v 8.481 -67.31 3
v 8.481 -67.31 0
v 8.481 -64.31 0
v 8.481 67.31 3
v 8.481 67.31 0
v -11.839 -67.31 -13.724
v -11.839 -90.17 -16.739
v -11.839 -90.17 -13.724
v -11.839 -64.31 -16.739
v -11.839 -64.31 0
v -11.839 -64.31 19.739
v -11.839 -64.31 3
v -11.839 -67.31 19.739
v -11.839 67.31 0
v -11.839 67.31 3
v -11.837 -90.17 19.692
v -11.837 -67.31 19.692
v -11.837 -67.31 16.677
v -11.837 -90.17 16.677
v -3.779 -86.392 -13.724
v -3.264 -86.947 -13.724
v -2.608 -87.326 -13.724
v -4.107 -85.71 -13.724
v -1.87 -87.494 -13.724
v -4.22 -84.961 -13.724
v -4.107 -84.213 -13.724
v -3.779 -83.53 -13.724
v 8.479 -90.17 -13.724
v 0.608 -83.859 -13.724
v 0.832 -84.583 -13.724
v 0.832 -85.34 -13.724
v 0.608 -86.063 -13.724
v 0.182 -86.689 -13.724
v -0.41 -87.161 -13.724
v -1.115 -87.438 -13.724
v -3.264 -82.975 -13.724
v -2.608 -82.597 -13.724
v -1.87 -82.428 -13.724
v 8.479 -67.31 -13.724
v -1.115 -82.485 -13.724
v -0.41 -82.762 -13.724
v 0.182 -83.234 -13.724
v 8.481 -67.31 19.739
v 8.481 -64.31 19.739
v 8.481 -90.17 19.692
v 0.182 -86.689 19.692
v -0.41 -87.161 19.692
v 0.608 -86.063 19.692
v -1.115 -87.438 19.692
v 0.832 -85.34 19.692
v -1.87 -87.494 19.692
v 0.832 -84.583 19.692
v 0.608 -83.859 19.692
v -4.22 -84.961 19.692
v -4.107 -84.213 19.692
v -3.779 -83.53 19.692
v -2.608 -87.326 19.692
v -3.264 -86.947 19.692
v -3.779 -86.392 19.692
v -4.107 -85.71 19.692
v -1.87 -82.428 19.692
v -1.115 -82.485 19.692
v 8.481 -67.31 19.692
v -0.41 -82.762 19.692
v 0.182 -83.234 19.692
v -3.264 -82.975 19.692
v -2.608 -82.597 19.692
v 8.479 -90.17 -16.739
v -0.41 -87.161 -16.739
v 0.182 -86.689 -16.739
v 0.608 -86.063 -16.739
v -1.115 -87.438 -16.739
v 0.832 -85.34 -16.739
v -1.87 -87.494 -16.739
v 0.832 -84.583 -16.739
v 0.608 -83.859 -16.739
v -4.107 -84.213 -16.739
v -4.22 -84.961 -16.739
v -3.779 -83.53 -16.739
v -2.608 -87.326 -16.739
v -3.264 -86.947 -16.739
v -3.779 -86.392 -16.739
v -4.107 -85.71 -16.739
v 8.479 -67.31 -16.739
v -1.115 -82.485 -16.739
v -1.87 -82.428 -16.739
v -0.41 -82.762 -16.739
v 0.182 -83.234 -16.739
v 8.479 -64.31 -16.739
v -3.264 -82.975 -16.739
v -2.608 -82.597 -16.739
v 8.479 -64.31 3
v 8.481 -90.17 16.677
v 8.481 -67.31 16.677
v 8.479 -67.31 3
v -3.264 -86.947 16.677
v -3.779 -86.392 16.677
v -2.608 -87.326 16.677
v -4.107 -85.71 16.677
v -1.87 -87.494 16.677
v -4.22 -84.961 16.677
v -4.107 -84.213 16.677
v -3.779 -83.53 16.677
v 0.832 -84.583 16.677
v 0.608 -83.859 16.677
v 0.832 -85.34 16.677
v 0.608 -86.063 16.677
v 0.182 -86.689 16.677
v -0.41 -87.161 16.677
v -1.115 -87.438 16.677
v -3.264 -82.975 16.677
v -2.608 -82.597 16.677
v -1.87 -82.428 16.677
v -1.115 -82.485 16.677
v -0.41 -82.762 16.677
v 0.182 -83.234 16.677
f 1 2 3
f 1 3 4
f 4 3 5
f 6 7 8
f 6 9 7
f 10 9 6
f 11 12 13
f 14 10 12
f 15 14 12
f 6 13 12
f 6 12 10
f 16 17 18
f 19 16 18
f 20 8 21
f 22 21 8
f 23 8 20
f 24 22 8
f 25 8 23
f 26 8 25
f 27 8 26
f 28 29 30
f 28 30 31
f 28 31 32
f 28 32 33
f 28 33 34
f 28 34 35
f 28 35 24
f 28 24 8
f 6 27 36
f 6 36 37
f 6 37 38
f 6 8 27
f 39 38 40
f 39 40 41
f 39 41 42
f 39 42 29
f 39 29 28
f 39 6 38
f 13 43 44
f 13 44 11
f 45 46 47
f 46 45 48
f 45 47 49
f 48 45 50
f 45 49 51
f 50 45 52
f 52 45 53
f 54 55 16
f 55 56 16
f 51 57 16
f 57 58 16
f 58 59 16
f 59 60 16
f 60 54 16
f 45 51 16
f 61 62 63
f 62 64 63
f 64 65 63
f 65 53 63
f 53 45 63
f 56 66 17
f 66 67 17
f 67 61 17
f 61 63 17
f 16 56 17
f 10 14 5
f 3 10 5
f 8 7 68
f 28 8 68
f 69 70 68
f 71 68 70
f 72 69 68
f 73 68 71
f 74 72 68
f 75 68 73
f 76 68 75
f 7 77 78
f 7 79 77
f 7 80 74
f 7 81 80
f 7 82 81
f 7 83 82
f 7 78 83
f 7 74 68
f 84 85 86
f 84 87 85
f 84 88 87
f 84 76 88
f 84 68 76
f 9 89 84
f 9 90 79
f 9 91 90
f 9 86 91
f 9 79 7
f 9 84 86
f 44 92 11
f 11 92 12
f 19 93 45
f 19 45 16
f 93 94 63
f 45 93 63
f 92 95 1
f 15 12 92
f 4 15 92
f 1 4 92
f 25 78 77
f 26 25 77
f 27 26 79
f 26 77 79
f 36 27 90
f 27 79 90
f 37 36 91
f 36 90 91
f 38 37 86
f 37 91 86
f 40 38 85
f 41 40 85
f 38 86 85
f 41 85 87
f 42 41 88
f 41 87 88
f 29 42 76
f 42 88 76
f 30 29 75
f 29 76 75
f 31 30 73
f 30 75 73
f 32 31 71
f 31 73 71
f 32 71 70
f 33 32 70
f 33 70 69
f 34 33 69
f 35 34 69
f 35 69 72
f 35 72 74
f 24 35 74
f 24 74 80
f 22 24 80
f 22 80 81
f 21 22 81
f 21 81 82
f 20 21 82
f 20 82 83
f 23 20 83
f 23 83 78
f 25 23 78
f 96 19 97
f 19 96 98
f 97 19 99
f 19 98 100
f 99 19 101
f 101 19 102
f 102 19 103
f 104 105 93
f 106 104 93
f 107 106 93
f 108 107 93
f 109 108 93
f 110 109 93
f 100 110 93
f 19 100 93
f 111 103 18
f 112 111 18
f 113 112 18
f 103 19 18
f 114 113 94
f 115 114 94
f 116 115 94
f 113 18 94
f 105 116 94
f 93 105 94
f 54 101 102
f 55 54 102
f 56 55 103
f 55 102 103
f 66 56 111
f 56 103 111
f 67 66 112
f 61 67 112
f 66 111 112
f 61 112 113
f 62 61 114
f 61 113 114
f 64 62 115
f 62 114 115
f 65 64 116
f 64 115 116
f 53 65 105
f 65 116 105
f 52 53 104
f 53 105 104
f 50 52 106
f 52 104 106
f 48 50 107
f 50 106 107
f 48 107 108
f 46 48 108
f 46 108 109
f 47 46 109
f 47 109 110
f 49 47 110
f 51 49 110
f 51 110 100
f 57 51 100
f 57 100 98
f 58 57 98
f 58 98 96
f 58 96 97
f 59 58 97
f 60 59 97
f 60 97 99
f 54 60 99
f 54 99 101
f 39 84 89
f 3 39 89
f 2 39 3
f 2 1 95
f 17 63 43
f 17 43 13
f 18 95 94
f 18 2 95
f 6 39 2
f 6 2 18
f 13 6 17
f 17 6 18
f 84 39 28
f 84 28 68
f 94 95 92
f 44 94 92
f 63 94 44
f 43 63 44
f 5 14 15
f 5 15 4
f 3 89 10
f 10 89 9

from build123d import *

# Parameters (mm, degrees)
SKETCH1_W           = 20.32
SKETCH1_H           = 134.62
BOSS_EXTRUDE1_DEPTH = 2.999994
BOSS_EXTRUDE2_DEPTH = 2.999994
BOSS_EXTRUDE3_DEPTH = 22.86
SKETCH4_R           = 2.54
CUT_EXTRUDE1_DEPTH  = 37.477194


with BuildPart() as part:
    # Sketch1 → Boss-Extrude1 (new body)
    with BuildSketch(Plane.XY):
        with Locations((-1.678928241, 0)):
            Rectangle(SKETCH1_W, SKETCH1_H)
    extrude(amount=BOSS_EXTRUDE1_DEPTH)

    # Sketch2 → Boss-Extrude2 (add)
    with BuildSketch(Plane(origin=(0, -67.31, 0), x_dir=(1, 0, 0), z_dir=(0, 1, 0))):
        Polygon((-11.838928241, 0), (-11.838928241, 16.7386), (8.478742997, 16.7386), (8.481071759, 0), (8.478742997, -2.999994), (8.481071759, -19.738594), (-11.838928241, -19.738594), (-11.838928241, -2.999994), align=None)
    extrude(amount=BOSS_EXTRUDE2_DEPTH)

    # Sketch3 → Boss-Extrude3 (add)
    with BuildSketch(Plane(origin=(0, -67.31, 0), x_dir=(-1, 0, 0), z_dir=(0, -1, 0))):
        Polygon((11.838928241, 16.7386), (11.838928241, 13.72362), (-8.479162457, 13.72362), (-8.478742997, 16.7386), align=None)
        Polygon((-8.481065309, -16.677248459), (-8.481065309, -19.692228459), (11.837025389, -19.692228459), (11.836605929, -16.677248459), align=None)
    extrude(amount=BOSS_EXTRUDE3_DEPTH)

    # Sketch4 → Cut-Extrude1 (cut, through all)
    with BuildSketch(Plane(origin=(0, 0, -16.7386), x_dir=(-1, 0, 0), z_dir=(0, 0, -1))):
        with Locations((1.680092622, -84.961272754)):
            Circle(SKETCH4_R)
    extrude(amount=-CUT_EXTRUDE1_DEPTH, mode=Mode.SUBTRACT)


solid = part.part
